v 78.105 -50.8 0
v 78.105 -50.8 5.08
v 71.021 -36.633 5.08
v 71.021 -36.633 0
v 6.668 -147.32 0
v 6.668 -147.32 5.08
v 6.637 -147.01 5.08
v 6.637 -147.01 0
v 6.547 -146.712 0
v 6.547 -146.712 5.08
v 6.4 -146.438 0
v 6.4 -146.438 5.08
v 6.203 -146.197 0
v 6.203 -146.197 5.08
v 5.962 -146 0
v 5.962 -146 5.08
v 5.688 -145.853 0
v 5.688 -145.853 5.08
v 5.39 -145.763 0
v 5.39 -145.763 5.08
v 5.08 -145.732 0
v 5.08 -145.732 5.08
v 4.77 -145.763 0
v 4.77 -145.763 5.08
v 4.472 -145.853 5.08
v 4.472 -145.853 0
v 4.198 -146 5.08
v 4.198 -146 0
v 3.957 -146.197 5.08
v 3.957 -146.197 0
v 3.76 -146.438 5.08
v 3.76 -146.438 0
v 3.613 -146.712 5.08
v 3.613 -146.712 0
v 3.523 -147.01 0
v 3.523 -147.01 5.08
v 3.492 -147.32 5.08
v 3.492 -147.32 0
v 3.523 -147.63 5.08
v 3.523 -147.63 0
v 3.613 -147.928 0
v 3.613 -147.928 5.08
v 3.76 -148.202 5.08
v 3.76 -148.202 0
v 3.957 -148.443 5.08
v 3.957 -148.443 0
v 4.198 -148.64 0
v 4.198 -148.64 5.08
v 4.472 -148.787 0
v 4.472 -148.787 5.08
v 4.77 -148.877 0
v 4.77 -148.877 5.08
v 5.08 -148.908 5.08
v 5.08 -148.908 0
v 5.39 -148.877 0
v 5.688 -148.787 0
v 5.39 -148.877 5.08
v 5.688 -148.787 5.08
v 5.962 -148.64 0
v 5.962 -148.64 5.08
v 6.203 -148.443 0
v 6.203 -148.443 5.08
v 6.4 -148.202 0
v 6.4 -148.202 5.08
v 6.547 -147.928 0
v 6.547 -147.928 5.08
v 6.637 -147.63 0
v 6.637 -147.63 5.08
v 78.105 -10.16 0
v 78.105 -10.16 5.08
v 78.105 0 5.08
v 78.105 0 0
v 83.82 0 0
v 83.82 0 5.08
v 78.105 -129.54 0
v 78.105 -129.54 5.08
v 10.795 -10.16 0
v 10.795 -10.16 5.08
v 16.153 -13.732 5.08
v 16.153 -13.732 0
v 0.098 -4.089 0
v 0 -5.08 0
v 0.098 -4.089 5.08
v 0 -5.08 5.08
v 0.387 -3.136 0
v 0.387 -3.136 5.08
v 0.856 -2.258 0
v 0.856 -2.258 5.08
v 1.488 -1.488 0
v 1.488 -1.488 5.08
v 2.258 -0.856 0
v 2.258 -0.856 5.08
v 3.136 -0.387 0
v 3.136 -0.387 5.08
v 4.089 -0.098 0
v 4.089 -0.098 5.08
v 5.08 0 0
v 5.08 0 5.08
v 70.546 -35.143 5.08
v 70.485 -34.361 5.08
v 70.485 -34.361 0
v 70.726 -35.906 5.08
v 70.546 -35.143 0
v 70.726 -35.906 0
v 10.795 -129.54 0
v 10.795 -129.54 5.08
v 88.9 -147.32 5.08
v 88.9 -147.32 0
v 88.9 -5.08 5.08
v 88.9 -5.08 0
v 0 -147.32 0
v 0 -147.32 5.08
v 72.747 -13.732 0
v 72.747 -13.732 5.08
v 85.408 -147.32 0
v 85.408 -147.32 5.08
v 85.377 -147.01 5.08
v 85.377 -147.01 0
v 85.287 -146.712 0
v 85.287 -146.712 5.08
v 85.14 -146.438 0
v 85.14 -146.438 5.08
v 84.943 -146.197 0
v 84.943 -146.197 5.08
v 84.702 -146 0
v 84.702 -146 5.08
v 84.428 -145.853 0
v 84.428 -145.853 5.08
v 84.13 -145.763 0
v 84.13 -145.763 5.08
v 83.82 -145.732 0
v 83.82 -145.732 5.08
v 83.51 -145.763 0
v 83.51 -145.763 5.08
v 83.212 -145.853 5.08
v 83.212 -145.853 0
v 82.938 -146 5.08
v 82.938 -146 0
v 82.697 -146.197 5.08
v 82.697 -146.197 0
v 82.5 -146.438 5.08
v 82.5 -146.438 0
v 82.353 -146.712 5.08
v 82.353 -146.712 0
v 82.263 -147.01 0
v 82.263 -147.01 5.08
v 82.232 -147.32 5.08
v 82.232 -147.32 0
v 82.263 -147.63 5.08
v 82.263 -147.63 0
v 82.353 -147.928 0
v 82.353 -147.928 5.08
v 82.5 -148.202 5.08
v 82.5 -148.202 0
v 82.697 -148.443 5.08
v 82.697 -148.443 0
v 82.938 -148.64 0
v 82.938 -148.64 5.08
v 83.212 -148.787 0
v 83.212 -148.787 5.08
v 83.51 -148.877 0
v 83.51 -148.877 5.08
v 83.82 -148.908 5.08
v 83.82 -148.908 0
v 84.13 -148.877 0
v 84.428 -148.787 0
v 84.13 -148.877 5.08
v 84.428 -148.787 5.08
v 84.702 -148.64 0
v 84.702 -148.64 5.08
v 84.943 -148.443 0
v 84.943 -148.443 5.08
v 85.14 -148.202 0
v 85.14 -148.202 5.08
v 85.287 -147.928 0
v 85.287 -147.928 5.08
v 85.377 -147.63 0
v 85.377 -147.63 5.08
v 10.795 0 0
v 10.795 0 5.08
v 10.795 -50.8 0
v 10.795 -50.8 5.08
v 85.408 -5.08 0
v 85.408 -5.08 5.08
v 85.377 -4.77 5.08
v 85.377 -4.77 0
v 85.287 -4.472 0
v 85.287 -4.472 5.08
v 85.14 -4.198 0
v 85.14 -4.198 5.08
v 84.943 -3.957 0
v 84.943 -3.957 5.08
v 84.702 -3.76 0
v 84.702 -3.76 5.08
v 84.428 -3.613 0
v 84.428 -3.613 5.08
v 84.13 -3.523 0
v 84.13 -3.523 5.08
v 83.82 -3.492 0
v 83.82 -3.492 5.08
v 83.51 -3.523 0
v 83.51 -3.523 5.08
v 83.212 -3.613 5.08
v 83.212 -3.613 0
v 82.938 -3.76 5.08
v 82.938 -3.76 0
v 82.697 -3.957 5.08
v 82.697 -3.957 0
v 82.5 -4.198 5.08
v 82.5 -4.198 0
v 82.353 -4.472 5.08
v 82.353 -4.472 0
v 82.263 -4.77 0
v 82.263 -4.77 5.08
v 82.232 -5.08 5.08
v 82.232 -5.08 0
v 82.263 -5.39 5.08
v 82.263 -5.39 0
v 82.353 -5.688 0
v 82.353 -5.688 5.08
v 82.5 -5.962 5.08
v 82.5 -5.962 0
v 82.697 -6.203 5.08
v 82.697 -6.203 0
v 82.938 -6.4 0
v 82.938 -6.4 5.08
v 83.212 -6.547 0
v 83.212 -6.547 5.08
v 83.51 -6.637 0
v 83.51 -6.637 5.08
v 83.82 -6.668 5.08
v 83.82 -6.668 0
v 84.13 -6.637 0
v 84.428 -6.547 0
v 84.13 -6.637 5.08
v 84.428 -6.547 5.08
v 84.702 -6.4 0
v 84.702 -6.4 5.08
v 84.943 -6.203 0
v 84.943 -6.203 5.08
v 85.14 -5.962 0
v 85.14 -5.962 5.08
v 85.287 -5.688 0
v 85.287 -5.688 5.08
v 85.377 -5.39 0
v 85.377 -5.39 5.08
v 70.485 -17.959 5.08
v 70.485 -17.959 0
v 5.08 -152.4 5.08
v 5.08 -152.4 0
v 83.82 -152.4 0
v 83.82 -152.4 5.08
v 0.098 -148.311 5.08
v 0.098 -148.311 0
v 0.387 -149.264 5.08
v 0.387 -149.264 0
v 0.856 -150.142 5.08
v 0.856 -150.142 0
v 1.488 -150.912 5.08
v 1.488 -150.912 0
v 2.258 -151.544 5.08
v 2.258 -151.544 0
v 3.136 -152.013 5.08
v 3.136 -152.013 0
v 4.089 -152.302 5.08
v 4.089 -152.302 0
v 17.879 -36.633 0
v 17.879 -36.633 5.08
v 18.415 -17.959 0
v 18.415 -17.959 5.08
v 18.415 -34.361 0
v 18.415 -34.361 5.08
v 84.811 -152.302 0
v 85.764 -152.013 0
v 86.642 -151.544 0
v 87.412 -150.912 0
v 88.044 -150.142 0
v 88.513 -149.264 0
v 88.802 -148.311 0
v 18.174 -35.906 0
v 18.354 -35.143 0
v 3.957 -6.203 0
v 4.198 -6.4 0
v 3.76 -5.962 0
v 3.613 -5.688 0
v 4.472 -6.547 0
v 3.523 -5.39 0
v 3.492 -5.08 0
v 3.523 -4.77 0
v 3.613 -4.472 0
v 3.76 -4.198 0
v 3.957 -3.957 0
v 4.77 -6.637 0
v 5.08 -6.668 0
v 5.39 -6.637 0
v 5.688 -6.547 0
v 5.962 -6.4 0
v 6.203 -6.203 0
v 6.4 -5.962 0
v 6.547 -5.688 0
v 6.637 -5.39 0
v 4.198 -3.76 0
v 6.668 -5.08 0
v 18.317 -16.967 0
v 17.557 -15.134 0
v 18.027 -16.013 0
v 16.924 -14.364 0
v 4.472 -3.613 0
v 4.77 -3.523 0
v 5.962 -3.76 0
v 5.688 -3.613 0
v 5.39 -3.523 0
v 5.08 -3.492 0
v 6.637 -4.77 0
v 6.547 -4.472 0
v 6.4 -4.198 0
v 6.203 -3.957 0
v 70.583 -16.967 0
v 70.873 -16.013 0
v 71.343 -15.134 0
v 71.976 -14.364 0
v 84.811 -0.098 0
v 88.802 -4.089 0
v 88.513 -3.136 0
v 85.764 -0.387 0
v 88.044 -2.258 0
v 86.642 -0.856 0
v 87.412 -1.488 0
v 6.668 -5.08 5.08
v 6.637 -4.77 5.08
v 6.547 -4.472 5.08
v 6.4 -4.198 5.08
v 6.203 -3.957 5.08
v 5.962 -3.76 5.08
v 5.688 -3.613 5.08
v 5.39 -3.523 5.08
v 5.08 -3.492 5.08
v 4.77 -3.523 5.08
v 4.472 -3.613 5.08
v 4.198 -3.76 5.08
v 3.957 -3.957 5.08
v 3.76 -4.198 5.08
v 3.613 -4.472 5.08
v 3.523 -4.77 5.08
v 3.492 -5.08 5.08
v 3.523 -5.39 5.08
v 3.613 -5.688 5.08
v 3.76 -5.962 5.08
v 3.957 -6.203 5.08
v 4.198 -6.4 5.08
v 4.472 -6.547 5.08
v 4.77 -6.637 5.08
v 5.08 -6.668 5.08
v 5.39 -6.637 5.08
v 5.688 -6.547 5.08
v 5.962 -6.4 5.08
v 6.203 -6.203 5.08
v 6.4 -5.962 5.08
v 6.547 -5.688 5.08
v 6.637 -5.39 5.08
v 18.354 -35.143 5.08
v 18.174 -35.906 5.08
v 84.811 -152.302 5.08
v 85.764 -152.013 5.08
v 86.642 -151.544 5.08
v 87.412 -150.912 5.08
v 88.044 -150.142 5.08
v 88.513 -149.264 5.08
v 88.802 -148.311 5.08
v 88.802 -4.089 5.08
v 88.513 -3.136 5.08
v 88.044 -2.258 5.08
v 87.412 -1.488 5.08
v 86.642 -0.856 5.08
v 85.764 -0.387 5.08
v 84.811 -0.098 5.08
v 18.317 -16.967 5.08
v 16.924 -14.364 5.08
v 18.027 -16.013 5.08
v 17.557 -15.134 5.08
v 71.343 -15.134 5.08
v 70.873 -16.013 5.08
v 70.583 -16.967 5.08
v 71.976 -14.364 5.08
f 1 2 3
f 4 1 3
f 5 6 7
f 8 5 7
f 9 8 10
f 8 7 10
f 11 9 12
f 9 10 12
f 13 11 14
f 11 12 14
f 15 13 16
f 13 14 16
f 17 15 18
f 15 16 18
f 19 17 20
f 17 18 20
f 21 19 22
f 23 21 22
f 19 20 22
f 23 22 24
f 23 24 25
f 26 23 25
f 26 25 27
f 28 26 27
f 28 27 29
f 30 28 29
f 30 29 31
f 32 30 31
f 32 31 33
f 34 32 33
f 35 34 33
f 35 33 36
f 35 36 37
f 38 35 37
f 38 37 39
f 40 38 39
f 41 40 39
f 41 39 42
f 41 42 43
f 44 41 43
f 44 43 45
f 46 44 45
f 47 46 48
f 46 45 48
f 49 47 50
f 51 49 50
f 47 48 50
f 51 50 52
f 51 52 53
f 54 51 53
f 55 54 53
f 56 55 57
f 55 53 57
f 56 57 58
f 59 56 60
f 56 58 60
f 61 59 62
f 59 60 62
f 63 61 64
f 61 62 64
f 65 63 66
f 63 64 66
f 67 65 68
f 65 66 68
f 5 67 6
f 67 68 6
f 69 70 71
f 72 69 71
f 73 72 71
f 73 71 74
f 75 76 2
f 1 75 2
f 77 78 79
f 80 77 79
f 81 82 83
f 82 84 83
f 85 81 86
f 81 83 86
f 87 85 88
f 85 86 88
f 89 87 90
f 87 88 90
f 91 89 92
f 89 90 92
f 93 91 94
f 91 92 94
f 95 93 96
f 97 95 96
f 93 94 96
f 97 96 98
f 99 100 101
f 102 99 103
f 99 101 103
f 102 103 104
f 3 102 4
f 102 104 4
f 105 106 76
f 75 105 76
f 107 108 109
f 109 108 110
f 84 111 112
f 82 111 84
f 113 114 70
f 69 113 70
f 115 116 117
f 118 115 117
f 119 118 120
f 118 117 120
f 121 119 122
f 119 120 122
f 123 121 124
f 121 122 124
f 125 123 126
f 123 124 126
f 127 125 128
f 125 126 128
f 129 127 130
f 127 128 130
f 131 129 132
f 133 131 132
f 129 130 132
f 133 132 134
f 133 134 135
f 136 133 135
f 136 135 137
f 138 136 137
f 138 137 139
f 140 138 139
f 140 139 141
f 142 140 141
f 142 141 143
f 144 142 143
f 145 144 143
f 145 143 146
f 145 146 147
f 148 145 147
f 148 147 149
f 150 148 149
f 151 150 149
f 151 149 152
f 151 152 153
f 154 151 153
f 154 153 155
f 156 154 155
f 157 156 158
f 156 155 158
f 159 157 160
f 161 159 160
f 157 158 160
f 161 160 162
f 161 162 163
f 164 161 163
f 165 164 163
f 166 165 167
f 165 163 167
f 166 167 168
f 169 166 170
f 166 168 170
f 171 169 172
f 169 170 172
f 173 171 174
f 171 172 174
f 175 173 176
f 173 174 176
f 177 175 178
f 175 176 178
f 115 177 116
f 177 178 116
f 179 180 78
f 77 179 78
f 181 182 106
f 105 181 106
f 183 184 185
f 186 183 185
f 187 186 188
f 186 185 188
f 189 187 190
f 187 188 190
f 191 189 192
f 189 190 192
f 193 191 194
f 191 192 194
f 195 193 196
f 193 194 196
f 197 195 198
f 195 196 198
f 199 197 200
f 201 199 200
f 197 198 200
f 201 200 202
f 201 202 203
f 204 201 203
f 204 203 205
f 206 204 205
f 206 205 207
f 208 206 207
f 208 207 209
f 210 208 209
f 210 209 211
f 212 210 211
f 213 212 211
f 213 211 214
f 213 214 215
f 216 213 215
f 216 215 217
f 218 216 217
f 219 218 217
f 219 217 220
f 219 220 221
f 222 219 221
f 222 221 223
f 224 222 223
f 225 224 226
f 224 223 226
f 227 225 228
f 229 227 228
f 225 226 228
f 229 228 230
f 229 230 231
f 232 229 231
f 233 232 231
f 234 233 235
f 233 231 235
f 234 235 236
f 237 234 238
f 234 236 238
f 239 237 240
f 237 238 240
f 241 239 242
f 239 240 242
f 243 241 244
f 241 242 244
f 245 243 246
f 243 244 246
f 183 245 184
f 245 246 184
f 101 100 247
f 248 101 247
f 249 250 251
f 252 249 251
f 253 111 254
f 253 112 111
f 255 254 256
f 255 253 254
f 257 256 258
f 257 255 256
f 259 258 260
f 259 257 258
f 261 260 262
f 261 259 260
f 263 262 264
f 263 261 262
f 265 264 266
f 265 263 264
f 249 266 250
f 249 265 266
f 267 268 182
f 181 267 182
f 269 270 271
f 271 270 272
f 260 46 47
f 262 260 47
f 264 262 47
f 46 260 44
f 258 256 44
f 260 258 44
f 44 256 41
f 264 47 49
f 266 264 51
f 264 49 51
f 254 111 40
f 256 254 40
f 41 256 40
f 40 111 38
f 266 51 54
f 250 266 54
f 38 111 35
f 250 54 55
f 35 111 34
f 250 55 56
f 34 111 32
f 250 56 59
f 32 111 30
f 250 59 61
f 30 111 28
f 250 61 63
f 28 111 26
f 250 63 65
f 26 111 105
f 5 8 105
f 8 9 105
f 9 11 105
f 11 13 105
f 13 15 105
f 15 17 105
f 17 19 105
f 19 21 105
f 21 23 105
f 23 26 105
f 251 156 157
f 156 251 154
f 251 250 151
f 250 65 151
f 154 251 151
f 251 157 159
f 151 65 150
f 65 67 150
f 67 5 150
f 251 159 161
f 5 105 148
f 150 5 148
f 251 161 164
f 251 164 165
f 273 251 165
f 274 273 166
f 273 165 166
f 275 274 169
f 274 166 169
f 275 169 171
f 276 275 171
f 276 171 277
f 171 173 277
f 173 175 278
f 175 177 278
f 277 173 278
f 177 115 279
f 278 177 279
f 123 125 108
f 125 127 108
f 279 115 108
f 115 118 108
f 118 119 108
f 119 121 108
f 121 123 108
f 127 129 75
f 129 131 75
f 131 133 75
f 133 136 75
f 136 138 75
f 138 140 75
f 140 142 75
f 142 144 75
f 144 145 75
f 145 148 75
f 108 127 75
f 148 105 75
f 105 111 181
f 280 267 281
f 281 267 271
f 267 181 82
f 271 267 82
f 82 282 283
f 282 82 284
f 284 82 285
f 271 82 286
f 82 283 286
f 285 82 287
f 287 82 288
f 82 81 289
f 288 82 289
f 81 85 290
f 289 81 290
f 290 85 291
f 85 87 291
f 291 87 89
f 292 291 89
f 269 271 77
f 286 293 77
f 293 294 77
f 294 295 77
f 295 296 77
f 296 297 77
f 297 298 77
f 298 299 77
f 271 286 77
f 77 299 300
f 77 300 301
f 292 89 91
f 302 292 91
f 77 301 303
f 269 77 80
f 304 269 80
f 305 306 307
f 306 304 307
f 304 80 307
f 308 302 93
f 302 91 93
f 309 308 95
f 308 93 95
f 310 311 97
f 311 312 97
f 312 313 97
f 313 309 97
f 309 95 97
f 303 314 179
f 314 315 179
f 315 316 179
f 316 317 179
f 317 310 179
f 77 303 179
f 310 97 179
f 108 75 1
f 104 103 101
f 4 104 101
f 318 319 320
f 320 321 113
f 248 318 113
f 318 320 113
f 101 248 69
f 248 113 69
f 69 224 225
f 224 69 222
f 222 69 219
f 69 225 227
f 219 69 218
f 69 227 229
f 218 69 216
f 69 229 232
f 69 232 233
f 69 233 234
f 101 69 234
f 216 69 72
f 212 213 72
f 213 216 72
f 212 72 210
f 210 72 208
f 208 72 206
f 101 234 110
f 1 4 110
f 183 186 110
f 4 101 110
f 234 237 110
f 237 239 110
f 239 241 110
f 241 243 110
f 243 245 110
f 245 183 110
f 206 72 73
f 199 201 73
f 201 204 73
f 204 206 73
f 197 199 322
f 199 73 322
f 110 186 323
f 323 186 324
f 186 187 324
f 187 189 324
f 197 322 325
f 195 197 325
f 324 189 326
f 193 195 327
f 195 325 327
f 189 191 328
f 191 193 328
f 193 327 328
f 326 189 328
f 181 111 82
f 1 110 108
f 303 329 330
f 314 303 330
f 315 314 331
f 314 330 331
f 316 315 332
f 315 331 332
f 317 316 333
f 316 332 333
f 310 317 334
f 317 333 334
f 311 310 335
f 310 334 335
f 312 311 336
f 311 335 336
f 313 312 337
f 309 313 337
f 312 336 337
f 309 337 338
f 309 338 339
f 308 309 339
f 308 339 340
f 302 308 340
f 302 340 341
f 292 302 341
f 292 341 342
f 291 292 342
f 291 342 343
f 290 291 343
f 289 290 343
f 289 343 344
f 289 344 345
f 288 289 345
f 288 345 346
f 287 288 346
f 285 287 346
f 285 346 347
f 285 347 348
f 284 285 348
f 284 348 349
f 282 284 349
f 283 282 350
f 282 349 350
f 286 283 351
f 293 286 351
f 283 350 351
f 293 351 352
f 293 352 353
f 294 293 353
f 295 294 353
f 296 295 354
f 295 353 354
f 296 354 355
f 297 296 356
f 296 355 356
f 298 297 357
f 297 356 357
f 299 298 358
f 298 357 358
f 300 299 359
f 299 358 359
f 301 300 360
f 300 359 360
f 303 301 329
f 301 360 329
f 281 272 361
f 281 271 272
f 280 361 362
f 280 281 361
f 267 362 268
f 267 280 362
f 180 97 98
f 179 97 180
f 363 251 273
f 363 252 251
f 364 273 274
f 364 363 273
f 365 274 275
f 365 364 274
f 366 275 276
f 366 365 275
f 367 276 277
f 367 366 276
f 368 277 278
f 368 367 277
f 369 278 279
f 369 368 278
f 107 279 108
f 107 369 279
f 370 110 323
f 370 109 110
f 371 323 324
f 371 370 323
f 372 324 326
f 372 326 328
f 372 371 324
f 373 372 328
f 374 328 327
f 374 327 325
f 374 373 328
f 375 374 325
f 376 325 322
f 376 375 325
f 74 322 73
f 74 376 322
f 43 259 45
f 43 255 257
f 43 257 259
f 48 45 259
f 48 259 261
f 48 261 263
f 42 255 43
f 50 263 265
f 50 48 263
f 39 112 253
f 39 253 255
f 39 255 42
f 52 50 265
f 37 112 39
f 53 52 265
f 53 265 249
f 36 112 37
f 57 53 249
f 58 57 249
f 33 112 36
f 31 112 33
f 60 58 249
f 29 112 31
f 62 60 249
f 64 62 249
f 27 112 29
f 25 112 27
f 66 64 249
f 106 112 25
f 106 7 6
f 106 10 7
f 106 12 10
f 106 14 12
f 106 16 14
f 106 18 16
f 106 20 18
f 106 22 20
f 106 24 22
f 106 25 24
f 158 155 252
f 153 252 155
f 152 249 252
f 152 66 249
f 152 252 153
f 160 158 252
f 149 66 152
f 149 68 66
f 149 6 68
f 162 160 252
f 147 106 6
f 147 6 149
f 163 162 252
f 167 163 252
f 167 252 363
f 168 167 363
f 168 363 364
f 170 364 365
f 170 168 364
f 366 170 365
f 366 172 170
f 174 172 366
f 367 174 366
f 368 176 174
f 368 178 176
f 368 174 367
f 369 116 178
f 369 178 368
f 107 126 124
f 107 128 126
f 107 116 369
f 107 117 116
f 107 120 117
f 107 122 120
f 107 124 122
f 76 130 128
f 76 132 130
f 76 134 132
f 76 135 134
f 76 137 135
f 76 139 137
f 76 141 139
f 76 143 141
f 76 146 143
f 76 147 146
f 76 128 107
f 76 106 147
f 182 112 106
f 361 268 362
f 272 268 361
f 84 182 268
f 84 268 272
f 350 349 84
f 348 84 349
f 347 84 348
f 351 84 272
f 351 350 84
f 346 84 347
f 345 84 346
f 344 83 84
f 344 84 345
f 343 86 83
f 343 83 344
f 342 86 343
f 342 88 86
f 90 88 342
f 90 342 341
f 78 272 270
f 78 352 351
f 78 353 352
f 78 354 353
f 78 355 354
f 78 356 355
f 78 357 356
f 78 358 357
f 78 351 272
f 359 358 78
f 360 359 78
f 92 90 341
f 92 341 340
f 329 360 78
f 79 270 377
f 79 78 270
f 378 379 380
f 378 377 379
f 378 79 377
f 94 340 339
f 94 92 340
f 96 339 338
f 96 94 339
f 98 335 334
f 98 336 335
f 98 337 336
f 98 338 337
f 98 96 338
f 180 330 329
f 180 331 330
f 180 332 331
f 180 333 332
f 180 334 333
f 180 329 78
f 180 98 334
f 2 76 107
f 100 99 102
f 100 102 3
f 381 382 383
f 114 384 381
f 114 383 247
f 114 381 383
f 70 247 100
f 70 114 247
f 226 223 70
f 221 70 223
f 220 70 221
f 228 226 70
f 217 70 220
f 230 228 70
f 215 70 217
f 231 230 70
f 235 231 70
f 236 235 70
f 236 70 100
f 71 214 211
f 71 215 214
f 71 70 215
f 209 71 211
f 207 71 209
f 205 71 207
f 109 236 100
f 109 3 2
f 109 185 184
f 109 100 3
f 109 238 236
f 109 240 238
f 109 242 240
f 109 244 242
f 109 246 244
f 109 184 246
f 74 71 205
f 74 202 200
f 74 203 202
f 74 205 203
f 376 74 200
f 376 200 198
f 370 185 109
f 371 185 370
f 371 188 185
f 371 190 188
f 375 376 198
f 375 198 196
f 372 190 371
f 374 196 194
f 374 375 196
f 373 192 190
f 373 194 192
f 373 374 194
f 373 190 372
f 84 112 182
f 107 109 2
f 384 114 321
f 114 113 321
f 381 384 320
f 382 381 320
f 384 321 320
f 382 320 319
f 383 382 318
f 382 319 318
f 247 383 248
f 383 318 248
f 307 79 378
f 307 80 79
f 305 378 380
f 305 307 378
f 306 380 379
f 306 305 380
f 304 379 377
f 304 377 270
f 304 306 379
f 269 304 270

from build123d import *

# Parameters (mm, degrees)
F0_W     = 88.9
F0_H     = 152.4
F1_DEPTH = 5.08
F3_DEPTH = 25.4
F4_R     = 1.5875
F5_DEPTH = 25.4
F6_R     = 5.08


with BuildPart() as f1:
    # F0 (on Top) → F1 (new body)
    with BuildSketch(Plane.XY):
        with Locations((44.45, -76.2)):
            Rectangle(F0_W, F0_H)
    extrude(amount=F1_DEPTH)

    # F2 (on face) → F3 (cut)
    with BuildSketch(Plane.XY.offset(5.08)):
        Polygon((78.105, 0), (10.795, 0), (10.795, -10.16), (18.415, -15.24), (18.415, -35.56), (10.795, -50.8), (10.795, -129.54), (78.105, -129.54), (78.105, -50.8), (70.485, -35.56), (70.485, -15.24), (78.105, -10.16), align=None)
    extrude(amount=-F3_DEPTH, mode=Mode.SUBTRACT)

    # F4 (on face) → F5 (cut)
    with BuildSketch(Plane.XY.offset(5.08)):
        with Locations((5.08, -5.08)):
            Circle(F4_R)
        with Locations((83.82, -5.08)):
            Circle(F4_R)
        with Locations((83.82, -147.32)):
            Circle(F4_R)
        with Locations((5.08, -147.32)):
            Circle(F4_R)
    extrude(amount=-F5_DEPTH, mode=Mode.SUBTRACT)

    # F6
    f6_edges = [f1.edges().sort_by_distance(p)[0] for p in [
        (88.9, -152.4, 2.54),
        (0, -152.4, 2.54),
        (88.9, 0, 2.54),
        (0, 0, 2.54),
        (18.415, -15.24, 2.54),
        (18.415, -35.56, 2.54),
        (70.485, -35.56, 2.54),
        (70.485, -15.24, 2.54),
    ]]
    fillet(f6_edges, radius=F6_R)


solid = f1.part
